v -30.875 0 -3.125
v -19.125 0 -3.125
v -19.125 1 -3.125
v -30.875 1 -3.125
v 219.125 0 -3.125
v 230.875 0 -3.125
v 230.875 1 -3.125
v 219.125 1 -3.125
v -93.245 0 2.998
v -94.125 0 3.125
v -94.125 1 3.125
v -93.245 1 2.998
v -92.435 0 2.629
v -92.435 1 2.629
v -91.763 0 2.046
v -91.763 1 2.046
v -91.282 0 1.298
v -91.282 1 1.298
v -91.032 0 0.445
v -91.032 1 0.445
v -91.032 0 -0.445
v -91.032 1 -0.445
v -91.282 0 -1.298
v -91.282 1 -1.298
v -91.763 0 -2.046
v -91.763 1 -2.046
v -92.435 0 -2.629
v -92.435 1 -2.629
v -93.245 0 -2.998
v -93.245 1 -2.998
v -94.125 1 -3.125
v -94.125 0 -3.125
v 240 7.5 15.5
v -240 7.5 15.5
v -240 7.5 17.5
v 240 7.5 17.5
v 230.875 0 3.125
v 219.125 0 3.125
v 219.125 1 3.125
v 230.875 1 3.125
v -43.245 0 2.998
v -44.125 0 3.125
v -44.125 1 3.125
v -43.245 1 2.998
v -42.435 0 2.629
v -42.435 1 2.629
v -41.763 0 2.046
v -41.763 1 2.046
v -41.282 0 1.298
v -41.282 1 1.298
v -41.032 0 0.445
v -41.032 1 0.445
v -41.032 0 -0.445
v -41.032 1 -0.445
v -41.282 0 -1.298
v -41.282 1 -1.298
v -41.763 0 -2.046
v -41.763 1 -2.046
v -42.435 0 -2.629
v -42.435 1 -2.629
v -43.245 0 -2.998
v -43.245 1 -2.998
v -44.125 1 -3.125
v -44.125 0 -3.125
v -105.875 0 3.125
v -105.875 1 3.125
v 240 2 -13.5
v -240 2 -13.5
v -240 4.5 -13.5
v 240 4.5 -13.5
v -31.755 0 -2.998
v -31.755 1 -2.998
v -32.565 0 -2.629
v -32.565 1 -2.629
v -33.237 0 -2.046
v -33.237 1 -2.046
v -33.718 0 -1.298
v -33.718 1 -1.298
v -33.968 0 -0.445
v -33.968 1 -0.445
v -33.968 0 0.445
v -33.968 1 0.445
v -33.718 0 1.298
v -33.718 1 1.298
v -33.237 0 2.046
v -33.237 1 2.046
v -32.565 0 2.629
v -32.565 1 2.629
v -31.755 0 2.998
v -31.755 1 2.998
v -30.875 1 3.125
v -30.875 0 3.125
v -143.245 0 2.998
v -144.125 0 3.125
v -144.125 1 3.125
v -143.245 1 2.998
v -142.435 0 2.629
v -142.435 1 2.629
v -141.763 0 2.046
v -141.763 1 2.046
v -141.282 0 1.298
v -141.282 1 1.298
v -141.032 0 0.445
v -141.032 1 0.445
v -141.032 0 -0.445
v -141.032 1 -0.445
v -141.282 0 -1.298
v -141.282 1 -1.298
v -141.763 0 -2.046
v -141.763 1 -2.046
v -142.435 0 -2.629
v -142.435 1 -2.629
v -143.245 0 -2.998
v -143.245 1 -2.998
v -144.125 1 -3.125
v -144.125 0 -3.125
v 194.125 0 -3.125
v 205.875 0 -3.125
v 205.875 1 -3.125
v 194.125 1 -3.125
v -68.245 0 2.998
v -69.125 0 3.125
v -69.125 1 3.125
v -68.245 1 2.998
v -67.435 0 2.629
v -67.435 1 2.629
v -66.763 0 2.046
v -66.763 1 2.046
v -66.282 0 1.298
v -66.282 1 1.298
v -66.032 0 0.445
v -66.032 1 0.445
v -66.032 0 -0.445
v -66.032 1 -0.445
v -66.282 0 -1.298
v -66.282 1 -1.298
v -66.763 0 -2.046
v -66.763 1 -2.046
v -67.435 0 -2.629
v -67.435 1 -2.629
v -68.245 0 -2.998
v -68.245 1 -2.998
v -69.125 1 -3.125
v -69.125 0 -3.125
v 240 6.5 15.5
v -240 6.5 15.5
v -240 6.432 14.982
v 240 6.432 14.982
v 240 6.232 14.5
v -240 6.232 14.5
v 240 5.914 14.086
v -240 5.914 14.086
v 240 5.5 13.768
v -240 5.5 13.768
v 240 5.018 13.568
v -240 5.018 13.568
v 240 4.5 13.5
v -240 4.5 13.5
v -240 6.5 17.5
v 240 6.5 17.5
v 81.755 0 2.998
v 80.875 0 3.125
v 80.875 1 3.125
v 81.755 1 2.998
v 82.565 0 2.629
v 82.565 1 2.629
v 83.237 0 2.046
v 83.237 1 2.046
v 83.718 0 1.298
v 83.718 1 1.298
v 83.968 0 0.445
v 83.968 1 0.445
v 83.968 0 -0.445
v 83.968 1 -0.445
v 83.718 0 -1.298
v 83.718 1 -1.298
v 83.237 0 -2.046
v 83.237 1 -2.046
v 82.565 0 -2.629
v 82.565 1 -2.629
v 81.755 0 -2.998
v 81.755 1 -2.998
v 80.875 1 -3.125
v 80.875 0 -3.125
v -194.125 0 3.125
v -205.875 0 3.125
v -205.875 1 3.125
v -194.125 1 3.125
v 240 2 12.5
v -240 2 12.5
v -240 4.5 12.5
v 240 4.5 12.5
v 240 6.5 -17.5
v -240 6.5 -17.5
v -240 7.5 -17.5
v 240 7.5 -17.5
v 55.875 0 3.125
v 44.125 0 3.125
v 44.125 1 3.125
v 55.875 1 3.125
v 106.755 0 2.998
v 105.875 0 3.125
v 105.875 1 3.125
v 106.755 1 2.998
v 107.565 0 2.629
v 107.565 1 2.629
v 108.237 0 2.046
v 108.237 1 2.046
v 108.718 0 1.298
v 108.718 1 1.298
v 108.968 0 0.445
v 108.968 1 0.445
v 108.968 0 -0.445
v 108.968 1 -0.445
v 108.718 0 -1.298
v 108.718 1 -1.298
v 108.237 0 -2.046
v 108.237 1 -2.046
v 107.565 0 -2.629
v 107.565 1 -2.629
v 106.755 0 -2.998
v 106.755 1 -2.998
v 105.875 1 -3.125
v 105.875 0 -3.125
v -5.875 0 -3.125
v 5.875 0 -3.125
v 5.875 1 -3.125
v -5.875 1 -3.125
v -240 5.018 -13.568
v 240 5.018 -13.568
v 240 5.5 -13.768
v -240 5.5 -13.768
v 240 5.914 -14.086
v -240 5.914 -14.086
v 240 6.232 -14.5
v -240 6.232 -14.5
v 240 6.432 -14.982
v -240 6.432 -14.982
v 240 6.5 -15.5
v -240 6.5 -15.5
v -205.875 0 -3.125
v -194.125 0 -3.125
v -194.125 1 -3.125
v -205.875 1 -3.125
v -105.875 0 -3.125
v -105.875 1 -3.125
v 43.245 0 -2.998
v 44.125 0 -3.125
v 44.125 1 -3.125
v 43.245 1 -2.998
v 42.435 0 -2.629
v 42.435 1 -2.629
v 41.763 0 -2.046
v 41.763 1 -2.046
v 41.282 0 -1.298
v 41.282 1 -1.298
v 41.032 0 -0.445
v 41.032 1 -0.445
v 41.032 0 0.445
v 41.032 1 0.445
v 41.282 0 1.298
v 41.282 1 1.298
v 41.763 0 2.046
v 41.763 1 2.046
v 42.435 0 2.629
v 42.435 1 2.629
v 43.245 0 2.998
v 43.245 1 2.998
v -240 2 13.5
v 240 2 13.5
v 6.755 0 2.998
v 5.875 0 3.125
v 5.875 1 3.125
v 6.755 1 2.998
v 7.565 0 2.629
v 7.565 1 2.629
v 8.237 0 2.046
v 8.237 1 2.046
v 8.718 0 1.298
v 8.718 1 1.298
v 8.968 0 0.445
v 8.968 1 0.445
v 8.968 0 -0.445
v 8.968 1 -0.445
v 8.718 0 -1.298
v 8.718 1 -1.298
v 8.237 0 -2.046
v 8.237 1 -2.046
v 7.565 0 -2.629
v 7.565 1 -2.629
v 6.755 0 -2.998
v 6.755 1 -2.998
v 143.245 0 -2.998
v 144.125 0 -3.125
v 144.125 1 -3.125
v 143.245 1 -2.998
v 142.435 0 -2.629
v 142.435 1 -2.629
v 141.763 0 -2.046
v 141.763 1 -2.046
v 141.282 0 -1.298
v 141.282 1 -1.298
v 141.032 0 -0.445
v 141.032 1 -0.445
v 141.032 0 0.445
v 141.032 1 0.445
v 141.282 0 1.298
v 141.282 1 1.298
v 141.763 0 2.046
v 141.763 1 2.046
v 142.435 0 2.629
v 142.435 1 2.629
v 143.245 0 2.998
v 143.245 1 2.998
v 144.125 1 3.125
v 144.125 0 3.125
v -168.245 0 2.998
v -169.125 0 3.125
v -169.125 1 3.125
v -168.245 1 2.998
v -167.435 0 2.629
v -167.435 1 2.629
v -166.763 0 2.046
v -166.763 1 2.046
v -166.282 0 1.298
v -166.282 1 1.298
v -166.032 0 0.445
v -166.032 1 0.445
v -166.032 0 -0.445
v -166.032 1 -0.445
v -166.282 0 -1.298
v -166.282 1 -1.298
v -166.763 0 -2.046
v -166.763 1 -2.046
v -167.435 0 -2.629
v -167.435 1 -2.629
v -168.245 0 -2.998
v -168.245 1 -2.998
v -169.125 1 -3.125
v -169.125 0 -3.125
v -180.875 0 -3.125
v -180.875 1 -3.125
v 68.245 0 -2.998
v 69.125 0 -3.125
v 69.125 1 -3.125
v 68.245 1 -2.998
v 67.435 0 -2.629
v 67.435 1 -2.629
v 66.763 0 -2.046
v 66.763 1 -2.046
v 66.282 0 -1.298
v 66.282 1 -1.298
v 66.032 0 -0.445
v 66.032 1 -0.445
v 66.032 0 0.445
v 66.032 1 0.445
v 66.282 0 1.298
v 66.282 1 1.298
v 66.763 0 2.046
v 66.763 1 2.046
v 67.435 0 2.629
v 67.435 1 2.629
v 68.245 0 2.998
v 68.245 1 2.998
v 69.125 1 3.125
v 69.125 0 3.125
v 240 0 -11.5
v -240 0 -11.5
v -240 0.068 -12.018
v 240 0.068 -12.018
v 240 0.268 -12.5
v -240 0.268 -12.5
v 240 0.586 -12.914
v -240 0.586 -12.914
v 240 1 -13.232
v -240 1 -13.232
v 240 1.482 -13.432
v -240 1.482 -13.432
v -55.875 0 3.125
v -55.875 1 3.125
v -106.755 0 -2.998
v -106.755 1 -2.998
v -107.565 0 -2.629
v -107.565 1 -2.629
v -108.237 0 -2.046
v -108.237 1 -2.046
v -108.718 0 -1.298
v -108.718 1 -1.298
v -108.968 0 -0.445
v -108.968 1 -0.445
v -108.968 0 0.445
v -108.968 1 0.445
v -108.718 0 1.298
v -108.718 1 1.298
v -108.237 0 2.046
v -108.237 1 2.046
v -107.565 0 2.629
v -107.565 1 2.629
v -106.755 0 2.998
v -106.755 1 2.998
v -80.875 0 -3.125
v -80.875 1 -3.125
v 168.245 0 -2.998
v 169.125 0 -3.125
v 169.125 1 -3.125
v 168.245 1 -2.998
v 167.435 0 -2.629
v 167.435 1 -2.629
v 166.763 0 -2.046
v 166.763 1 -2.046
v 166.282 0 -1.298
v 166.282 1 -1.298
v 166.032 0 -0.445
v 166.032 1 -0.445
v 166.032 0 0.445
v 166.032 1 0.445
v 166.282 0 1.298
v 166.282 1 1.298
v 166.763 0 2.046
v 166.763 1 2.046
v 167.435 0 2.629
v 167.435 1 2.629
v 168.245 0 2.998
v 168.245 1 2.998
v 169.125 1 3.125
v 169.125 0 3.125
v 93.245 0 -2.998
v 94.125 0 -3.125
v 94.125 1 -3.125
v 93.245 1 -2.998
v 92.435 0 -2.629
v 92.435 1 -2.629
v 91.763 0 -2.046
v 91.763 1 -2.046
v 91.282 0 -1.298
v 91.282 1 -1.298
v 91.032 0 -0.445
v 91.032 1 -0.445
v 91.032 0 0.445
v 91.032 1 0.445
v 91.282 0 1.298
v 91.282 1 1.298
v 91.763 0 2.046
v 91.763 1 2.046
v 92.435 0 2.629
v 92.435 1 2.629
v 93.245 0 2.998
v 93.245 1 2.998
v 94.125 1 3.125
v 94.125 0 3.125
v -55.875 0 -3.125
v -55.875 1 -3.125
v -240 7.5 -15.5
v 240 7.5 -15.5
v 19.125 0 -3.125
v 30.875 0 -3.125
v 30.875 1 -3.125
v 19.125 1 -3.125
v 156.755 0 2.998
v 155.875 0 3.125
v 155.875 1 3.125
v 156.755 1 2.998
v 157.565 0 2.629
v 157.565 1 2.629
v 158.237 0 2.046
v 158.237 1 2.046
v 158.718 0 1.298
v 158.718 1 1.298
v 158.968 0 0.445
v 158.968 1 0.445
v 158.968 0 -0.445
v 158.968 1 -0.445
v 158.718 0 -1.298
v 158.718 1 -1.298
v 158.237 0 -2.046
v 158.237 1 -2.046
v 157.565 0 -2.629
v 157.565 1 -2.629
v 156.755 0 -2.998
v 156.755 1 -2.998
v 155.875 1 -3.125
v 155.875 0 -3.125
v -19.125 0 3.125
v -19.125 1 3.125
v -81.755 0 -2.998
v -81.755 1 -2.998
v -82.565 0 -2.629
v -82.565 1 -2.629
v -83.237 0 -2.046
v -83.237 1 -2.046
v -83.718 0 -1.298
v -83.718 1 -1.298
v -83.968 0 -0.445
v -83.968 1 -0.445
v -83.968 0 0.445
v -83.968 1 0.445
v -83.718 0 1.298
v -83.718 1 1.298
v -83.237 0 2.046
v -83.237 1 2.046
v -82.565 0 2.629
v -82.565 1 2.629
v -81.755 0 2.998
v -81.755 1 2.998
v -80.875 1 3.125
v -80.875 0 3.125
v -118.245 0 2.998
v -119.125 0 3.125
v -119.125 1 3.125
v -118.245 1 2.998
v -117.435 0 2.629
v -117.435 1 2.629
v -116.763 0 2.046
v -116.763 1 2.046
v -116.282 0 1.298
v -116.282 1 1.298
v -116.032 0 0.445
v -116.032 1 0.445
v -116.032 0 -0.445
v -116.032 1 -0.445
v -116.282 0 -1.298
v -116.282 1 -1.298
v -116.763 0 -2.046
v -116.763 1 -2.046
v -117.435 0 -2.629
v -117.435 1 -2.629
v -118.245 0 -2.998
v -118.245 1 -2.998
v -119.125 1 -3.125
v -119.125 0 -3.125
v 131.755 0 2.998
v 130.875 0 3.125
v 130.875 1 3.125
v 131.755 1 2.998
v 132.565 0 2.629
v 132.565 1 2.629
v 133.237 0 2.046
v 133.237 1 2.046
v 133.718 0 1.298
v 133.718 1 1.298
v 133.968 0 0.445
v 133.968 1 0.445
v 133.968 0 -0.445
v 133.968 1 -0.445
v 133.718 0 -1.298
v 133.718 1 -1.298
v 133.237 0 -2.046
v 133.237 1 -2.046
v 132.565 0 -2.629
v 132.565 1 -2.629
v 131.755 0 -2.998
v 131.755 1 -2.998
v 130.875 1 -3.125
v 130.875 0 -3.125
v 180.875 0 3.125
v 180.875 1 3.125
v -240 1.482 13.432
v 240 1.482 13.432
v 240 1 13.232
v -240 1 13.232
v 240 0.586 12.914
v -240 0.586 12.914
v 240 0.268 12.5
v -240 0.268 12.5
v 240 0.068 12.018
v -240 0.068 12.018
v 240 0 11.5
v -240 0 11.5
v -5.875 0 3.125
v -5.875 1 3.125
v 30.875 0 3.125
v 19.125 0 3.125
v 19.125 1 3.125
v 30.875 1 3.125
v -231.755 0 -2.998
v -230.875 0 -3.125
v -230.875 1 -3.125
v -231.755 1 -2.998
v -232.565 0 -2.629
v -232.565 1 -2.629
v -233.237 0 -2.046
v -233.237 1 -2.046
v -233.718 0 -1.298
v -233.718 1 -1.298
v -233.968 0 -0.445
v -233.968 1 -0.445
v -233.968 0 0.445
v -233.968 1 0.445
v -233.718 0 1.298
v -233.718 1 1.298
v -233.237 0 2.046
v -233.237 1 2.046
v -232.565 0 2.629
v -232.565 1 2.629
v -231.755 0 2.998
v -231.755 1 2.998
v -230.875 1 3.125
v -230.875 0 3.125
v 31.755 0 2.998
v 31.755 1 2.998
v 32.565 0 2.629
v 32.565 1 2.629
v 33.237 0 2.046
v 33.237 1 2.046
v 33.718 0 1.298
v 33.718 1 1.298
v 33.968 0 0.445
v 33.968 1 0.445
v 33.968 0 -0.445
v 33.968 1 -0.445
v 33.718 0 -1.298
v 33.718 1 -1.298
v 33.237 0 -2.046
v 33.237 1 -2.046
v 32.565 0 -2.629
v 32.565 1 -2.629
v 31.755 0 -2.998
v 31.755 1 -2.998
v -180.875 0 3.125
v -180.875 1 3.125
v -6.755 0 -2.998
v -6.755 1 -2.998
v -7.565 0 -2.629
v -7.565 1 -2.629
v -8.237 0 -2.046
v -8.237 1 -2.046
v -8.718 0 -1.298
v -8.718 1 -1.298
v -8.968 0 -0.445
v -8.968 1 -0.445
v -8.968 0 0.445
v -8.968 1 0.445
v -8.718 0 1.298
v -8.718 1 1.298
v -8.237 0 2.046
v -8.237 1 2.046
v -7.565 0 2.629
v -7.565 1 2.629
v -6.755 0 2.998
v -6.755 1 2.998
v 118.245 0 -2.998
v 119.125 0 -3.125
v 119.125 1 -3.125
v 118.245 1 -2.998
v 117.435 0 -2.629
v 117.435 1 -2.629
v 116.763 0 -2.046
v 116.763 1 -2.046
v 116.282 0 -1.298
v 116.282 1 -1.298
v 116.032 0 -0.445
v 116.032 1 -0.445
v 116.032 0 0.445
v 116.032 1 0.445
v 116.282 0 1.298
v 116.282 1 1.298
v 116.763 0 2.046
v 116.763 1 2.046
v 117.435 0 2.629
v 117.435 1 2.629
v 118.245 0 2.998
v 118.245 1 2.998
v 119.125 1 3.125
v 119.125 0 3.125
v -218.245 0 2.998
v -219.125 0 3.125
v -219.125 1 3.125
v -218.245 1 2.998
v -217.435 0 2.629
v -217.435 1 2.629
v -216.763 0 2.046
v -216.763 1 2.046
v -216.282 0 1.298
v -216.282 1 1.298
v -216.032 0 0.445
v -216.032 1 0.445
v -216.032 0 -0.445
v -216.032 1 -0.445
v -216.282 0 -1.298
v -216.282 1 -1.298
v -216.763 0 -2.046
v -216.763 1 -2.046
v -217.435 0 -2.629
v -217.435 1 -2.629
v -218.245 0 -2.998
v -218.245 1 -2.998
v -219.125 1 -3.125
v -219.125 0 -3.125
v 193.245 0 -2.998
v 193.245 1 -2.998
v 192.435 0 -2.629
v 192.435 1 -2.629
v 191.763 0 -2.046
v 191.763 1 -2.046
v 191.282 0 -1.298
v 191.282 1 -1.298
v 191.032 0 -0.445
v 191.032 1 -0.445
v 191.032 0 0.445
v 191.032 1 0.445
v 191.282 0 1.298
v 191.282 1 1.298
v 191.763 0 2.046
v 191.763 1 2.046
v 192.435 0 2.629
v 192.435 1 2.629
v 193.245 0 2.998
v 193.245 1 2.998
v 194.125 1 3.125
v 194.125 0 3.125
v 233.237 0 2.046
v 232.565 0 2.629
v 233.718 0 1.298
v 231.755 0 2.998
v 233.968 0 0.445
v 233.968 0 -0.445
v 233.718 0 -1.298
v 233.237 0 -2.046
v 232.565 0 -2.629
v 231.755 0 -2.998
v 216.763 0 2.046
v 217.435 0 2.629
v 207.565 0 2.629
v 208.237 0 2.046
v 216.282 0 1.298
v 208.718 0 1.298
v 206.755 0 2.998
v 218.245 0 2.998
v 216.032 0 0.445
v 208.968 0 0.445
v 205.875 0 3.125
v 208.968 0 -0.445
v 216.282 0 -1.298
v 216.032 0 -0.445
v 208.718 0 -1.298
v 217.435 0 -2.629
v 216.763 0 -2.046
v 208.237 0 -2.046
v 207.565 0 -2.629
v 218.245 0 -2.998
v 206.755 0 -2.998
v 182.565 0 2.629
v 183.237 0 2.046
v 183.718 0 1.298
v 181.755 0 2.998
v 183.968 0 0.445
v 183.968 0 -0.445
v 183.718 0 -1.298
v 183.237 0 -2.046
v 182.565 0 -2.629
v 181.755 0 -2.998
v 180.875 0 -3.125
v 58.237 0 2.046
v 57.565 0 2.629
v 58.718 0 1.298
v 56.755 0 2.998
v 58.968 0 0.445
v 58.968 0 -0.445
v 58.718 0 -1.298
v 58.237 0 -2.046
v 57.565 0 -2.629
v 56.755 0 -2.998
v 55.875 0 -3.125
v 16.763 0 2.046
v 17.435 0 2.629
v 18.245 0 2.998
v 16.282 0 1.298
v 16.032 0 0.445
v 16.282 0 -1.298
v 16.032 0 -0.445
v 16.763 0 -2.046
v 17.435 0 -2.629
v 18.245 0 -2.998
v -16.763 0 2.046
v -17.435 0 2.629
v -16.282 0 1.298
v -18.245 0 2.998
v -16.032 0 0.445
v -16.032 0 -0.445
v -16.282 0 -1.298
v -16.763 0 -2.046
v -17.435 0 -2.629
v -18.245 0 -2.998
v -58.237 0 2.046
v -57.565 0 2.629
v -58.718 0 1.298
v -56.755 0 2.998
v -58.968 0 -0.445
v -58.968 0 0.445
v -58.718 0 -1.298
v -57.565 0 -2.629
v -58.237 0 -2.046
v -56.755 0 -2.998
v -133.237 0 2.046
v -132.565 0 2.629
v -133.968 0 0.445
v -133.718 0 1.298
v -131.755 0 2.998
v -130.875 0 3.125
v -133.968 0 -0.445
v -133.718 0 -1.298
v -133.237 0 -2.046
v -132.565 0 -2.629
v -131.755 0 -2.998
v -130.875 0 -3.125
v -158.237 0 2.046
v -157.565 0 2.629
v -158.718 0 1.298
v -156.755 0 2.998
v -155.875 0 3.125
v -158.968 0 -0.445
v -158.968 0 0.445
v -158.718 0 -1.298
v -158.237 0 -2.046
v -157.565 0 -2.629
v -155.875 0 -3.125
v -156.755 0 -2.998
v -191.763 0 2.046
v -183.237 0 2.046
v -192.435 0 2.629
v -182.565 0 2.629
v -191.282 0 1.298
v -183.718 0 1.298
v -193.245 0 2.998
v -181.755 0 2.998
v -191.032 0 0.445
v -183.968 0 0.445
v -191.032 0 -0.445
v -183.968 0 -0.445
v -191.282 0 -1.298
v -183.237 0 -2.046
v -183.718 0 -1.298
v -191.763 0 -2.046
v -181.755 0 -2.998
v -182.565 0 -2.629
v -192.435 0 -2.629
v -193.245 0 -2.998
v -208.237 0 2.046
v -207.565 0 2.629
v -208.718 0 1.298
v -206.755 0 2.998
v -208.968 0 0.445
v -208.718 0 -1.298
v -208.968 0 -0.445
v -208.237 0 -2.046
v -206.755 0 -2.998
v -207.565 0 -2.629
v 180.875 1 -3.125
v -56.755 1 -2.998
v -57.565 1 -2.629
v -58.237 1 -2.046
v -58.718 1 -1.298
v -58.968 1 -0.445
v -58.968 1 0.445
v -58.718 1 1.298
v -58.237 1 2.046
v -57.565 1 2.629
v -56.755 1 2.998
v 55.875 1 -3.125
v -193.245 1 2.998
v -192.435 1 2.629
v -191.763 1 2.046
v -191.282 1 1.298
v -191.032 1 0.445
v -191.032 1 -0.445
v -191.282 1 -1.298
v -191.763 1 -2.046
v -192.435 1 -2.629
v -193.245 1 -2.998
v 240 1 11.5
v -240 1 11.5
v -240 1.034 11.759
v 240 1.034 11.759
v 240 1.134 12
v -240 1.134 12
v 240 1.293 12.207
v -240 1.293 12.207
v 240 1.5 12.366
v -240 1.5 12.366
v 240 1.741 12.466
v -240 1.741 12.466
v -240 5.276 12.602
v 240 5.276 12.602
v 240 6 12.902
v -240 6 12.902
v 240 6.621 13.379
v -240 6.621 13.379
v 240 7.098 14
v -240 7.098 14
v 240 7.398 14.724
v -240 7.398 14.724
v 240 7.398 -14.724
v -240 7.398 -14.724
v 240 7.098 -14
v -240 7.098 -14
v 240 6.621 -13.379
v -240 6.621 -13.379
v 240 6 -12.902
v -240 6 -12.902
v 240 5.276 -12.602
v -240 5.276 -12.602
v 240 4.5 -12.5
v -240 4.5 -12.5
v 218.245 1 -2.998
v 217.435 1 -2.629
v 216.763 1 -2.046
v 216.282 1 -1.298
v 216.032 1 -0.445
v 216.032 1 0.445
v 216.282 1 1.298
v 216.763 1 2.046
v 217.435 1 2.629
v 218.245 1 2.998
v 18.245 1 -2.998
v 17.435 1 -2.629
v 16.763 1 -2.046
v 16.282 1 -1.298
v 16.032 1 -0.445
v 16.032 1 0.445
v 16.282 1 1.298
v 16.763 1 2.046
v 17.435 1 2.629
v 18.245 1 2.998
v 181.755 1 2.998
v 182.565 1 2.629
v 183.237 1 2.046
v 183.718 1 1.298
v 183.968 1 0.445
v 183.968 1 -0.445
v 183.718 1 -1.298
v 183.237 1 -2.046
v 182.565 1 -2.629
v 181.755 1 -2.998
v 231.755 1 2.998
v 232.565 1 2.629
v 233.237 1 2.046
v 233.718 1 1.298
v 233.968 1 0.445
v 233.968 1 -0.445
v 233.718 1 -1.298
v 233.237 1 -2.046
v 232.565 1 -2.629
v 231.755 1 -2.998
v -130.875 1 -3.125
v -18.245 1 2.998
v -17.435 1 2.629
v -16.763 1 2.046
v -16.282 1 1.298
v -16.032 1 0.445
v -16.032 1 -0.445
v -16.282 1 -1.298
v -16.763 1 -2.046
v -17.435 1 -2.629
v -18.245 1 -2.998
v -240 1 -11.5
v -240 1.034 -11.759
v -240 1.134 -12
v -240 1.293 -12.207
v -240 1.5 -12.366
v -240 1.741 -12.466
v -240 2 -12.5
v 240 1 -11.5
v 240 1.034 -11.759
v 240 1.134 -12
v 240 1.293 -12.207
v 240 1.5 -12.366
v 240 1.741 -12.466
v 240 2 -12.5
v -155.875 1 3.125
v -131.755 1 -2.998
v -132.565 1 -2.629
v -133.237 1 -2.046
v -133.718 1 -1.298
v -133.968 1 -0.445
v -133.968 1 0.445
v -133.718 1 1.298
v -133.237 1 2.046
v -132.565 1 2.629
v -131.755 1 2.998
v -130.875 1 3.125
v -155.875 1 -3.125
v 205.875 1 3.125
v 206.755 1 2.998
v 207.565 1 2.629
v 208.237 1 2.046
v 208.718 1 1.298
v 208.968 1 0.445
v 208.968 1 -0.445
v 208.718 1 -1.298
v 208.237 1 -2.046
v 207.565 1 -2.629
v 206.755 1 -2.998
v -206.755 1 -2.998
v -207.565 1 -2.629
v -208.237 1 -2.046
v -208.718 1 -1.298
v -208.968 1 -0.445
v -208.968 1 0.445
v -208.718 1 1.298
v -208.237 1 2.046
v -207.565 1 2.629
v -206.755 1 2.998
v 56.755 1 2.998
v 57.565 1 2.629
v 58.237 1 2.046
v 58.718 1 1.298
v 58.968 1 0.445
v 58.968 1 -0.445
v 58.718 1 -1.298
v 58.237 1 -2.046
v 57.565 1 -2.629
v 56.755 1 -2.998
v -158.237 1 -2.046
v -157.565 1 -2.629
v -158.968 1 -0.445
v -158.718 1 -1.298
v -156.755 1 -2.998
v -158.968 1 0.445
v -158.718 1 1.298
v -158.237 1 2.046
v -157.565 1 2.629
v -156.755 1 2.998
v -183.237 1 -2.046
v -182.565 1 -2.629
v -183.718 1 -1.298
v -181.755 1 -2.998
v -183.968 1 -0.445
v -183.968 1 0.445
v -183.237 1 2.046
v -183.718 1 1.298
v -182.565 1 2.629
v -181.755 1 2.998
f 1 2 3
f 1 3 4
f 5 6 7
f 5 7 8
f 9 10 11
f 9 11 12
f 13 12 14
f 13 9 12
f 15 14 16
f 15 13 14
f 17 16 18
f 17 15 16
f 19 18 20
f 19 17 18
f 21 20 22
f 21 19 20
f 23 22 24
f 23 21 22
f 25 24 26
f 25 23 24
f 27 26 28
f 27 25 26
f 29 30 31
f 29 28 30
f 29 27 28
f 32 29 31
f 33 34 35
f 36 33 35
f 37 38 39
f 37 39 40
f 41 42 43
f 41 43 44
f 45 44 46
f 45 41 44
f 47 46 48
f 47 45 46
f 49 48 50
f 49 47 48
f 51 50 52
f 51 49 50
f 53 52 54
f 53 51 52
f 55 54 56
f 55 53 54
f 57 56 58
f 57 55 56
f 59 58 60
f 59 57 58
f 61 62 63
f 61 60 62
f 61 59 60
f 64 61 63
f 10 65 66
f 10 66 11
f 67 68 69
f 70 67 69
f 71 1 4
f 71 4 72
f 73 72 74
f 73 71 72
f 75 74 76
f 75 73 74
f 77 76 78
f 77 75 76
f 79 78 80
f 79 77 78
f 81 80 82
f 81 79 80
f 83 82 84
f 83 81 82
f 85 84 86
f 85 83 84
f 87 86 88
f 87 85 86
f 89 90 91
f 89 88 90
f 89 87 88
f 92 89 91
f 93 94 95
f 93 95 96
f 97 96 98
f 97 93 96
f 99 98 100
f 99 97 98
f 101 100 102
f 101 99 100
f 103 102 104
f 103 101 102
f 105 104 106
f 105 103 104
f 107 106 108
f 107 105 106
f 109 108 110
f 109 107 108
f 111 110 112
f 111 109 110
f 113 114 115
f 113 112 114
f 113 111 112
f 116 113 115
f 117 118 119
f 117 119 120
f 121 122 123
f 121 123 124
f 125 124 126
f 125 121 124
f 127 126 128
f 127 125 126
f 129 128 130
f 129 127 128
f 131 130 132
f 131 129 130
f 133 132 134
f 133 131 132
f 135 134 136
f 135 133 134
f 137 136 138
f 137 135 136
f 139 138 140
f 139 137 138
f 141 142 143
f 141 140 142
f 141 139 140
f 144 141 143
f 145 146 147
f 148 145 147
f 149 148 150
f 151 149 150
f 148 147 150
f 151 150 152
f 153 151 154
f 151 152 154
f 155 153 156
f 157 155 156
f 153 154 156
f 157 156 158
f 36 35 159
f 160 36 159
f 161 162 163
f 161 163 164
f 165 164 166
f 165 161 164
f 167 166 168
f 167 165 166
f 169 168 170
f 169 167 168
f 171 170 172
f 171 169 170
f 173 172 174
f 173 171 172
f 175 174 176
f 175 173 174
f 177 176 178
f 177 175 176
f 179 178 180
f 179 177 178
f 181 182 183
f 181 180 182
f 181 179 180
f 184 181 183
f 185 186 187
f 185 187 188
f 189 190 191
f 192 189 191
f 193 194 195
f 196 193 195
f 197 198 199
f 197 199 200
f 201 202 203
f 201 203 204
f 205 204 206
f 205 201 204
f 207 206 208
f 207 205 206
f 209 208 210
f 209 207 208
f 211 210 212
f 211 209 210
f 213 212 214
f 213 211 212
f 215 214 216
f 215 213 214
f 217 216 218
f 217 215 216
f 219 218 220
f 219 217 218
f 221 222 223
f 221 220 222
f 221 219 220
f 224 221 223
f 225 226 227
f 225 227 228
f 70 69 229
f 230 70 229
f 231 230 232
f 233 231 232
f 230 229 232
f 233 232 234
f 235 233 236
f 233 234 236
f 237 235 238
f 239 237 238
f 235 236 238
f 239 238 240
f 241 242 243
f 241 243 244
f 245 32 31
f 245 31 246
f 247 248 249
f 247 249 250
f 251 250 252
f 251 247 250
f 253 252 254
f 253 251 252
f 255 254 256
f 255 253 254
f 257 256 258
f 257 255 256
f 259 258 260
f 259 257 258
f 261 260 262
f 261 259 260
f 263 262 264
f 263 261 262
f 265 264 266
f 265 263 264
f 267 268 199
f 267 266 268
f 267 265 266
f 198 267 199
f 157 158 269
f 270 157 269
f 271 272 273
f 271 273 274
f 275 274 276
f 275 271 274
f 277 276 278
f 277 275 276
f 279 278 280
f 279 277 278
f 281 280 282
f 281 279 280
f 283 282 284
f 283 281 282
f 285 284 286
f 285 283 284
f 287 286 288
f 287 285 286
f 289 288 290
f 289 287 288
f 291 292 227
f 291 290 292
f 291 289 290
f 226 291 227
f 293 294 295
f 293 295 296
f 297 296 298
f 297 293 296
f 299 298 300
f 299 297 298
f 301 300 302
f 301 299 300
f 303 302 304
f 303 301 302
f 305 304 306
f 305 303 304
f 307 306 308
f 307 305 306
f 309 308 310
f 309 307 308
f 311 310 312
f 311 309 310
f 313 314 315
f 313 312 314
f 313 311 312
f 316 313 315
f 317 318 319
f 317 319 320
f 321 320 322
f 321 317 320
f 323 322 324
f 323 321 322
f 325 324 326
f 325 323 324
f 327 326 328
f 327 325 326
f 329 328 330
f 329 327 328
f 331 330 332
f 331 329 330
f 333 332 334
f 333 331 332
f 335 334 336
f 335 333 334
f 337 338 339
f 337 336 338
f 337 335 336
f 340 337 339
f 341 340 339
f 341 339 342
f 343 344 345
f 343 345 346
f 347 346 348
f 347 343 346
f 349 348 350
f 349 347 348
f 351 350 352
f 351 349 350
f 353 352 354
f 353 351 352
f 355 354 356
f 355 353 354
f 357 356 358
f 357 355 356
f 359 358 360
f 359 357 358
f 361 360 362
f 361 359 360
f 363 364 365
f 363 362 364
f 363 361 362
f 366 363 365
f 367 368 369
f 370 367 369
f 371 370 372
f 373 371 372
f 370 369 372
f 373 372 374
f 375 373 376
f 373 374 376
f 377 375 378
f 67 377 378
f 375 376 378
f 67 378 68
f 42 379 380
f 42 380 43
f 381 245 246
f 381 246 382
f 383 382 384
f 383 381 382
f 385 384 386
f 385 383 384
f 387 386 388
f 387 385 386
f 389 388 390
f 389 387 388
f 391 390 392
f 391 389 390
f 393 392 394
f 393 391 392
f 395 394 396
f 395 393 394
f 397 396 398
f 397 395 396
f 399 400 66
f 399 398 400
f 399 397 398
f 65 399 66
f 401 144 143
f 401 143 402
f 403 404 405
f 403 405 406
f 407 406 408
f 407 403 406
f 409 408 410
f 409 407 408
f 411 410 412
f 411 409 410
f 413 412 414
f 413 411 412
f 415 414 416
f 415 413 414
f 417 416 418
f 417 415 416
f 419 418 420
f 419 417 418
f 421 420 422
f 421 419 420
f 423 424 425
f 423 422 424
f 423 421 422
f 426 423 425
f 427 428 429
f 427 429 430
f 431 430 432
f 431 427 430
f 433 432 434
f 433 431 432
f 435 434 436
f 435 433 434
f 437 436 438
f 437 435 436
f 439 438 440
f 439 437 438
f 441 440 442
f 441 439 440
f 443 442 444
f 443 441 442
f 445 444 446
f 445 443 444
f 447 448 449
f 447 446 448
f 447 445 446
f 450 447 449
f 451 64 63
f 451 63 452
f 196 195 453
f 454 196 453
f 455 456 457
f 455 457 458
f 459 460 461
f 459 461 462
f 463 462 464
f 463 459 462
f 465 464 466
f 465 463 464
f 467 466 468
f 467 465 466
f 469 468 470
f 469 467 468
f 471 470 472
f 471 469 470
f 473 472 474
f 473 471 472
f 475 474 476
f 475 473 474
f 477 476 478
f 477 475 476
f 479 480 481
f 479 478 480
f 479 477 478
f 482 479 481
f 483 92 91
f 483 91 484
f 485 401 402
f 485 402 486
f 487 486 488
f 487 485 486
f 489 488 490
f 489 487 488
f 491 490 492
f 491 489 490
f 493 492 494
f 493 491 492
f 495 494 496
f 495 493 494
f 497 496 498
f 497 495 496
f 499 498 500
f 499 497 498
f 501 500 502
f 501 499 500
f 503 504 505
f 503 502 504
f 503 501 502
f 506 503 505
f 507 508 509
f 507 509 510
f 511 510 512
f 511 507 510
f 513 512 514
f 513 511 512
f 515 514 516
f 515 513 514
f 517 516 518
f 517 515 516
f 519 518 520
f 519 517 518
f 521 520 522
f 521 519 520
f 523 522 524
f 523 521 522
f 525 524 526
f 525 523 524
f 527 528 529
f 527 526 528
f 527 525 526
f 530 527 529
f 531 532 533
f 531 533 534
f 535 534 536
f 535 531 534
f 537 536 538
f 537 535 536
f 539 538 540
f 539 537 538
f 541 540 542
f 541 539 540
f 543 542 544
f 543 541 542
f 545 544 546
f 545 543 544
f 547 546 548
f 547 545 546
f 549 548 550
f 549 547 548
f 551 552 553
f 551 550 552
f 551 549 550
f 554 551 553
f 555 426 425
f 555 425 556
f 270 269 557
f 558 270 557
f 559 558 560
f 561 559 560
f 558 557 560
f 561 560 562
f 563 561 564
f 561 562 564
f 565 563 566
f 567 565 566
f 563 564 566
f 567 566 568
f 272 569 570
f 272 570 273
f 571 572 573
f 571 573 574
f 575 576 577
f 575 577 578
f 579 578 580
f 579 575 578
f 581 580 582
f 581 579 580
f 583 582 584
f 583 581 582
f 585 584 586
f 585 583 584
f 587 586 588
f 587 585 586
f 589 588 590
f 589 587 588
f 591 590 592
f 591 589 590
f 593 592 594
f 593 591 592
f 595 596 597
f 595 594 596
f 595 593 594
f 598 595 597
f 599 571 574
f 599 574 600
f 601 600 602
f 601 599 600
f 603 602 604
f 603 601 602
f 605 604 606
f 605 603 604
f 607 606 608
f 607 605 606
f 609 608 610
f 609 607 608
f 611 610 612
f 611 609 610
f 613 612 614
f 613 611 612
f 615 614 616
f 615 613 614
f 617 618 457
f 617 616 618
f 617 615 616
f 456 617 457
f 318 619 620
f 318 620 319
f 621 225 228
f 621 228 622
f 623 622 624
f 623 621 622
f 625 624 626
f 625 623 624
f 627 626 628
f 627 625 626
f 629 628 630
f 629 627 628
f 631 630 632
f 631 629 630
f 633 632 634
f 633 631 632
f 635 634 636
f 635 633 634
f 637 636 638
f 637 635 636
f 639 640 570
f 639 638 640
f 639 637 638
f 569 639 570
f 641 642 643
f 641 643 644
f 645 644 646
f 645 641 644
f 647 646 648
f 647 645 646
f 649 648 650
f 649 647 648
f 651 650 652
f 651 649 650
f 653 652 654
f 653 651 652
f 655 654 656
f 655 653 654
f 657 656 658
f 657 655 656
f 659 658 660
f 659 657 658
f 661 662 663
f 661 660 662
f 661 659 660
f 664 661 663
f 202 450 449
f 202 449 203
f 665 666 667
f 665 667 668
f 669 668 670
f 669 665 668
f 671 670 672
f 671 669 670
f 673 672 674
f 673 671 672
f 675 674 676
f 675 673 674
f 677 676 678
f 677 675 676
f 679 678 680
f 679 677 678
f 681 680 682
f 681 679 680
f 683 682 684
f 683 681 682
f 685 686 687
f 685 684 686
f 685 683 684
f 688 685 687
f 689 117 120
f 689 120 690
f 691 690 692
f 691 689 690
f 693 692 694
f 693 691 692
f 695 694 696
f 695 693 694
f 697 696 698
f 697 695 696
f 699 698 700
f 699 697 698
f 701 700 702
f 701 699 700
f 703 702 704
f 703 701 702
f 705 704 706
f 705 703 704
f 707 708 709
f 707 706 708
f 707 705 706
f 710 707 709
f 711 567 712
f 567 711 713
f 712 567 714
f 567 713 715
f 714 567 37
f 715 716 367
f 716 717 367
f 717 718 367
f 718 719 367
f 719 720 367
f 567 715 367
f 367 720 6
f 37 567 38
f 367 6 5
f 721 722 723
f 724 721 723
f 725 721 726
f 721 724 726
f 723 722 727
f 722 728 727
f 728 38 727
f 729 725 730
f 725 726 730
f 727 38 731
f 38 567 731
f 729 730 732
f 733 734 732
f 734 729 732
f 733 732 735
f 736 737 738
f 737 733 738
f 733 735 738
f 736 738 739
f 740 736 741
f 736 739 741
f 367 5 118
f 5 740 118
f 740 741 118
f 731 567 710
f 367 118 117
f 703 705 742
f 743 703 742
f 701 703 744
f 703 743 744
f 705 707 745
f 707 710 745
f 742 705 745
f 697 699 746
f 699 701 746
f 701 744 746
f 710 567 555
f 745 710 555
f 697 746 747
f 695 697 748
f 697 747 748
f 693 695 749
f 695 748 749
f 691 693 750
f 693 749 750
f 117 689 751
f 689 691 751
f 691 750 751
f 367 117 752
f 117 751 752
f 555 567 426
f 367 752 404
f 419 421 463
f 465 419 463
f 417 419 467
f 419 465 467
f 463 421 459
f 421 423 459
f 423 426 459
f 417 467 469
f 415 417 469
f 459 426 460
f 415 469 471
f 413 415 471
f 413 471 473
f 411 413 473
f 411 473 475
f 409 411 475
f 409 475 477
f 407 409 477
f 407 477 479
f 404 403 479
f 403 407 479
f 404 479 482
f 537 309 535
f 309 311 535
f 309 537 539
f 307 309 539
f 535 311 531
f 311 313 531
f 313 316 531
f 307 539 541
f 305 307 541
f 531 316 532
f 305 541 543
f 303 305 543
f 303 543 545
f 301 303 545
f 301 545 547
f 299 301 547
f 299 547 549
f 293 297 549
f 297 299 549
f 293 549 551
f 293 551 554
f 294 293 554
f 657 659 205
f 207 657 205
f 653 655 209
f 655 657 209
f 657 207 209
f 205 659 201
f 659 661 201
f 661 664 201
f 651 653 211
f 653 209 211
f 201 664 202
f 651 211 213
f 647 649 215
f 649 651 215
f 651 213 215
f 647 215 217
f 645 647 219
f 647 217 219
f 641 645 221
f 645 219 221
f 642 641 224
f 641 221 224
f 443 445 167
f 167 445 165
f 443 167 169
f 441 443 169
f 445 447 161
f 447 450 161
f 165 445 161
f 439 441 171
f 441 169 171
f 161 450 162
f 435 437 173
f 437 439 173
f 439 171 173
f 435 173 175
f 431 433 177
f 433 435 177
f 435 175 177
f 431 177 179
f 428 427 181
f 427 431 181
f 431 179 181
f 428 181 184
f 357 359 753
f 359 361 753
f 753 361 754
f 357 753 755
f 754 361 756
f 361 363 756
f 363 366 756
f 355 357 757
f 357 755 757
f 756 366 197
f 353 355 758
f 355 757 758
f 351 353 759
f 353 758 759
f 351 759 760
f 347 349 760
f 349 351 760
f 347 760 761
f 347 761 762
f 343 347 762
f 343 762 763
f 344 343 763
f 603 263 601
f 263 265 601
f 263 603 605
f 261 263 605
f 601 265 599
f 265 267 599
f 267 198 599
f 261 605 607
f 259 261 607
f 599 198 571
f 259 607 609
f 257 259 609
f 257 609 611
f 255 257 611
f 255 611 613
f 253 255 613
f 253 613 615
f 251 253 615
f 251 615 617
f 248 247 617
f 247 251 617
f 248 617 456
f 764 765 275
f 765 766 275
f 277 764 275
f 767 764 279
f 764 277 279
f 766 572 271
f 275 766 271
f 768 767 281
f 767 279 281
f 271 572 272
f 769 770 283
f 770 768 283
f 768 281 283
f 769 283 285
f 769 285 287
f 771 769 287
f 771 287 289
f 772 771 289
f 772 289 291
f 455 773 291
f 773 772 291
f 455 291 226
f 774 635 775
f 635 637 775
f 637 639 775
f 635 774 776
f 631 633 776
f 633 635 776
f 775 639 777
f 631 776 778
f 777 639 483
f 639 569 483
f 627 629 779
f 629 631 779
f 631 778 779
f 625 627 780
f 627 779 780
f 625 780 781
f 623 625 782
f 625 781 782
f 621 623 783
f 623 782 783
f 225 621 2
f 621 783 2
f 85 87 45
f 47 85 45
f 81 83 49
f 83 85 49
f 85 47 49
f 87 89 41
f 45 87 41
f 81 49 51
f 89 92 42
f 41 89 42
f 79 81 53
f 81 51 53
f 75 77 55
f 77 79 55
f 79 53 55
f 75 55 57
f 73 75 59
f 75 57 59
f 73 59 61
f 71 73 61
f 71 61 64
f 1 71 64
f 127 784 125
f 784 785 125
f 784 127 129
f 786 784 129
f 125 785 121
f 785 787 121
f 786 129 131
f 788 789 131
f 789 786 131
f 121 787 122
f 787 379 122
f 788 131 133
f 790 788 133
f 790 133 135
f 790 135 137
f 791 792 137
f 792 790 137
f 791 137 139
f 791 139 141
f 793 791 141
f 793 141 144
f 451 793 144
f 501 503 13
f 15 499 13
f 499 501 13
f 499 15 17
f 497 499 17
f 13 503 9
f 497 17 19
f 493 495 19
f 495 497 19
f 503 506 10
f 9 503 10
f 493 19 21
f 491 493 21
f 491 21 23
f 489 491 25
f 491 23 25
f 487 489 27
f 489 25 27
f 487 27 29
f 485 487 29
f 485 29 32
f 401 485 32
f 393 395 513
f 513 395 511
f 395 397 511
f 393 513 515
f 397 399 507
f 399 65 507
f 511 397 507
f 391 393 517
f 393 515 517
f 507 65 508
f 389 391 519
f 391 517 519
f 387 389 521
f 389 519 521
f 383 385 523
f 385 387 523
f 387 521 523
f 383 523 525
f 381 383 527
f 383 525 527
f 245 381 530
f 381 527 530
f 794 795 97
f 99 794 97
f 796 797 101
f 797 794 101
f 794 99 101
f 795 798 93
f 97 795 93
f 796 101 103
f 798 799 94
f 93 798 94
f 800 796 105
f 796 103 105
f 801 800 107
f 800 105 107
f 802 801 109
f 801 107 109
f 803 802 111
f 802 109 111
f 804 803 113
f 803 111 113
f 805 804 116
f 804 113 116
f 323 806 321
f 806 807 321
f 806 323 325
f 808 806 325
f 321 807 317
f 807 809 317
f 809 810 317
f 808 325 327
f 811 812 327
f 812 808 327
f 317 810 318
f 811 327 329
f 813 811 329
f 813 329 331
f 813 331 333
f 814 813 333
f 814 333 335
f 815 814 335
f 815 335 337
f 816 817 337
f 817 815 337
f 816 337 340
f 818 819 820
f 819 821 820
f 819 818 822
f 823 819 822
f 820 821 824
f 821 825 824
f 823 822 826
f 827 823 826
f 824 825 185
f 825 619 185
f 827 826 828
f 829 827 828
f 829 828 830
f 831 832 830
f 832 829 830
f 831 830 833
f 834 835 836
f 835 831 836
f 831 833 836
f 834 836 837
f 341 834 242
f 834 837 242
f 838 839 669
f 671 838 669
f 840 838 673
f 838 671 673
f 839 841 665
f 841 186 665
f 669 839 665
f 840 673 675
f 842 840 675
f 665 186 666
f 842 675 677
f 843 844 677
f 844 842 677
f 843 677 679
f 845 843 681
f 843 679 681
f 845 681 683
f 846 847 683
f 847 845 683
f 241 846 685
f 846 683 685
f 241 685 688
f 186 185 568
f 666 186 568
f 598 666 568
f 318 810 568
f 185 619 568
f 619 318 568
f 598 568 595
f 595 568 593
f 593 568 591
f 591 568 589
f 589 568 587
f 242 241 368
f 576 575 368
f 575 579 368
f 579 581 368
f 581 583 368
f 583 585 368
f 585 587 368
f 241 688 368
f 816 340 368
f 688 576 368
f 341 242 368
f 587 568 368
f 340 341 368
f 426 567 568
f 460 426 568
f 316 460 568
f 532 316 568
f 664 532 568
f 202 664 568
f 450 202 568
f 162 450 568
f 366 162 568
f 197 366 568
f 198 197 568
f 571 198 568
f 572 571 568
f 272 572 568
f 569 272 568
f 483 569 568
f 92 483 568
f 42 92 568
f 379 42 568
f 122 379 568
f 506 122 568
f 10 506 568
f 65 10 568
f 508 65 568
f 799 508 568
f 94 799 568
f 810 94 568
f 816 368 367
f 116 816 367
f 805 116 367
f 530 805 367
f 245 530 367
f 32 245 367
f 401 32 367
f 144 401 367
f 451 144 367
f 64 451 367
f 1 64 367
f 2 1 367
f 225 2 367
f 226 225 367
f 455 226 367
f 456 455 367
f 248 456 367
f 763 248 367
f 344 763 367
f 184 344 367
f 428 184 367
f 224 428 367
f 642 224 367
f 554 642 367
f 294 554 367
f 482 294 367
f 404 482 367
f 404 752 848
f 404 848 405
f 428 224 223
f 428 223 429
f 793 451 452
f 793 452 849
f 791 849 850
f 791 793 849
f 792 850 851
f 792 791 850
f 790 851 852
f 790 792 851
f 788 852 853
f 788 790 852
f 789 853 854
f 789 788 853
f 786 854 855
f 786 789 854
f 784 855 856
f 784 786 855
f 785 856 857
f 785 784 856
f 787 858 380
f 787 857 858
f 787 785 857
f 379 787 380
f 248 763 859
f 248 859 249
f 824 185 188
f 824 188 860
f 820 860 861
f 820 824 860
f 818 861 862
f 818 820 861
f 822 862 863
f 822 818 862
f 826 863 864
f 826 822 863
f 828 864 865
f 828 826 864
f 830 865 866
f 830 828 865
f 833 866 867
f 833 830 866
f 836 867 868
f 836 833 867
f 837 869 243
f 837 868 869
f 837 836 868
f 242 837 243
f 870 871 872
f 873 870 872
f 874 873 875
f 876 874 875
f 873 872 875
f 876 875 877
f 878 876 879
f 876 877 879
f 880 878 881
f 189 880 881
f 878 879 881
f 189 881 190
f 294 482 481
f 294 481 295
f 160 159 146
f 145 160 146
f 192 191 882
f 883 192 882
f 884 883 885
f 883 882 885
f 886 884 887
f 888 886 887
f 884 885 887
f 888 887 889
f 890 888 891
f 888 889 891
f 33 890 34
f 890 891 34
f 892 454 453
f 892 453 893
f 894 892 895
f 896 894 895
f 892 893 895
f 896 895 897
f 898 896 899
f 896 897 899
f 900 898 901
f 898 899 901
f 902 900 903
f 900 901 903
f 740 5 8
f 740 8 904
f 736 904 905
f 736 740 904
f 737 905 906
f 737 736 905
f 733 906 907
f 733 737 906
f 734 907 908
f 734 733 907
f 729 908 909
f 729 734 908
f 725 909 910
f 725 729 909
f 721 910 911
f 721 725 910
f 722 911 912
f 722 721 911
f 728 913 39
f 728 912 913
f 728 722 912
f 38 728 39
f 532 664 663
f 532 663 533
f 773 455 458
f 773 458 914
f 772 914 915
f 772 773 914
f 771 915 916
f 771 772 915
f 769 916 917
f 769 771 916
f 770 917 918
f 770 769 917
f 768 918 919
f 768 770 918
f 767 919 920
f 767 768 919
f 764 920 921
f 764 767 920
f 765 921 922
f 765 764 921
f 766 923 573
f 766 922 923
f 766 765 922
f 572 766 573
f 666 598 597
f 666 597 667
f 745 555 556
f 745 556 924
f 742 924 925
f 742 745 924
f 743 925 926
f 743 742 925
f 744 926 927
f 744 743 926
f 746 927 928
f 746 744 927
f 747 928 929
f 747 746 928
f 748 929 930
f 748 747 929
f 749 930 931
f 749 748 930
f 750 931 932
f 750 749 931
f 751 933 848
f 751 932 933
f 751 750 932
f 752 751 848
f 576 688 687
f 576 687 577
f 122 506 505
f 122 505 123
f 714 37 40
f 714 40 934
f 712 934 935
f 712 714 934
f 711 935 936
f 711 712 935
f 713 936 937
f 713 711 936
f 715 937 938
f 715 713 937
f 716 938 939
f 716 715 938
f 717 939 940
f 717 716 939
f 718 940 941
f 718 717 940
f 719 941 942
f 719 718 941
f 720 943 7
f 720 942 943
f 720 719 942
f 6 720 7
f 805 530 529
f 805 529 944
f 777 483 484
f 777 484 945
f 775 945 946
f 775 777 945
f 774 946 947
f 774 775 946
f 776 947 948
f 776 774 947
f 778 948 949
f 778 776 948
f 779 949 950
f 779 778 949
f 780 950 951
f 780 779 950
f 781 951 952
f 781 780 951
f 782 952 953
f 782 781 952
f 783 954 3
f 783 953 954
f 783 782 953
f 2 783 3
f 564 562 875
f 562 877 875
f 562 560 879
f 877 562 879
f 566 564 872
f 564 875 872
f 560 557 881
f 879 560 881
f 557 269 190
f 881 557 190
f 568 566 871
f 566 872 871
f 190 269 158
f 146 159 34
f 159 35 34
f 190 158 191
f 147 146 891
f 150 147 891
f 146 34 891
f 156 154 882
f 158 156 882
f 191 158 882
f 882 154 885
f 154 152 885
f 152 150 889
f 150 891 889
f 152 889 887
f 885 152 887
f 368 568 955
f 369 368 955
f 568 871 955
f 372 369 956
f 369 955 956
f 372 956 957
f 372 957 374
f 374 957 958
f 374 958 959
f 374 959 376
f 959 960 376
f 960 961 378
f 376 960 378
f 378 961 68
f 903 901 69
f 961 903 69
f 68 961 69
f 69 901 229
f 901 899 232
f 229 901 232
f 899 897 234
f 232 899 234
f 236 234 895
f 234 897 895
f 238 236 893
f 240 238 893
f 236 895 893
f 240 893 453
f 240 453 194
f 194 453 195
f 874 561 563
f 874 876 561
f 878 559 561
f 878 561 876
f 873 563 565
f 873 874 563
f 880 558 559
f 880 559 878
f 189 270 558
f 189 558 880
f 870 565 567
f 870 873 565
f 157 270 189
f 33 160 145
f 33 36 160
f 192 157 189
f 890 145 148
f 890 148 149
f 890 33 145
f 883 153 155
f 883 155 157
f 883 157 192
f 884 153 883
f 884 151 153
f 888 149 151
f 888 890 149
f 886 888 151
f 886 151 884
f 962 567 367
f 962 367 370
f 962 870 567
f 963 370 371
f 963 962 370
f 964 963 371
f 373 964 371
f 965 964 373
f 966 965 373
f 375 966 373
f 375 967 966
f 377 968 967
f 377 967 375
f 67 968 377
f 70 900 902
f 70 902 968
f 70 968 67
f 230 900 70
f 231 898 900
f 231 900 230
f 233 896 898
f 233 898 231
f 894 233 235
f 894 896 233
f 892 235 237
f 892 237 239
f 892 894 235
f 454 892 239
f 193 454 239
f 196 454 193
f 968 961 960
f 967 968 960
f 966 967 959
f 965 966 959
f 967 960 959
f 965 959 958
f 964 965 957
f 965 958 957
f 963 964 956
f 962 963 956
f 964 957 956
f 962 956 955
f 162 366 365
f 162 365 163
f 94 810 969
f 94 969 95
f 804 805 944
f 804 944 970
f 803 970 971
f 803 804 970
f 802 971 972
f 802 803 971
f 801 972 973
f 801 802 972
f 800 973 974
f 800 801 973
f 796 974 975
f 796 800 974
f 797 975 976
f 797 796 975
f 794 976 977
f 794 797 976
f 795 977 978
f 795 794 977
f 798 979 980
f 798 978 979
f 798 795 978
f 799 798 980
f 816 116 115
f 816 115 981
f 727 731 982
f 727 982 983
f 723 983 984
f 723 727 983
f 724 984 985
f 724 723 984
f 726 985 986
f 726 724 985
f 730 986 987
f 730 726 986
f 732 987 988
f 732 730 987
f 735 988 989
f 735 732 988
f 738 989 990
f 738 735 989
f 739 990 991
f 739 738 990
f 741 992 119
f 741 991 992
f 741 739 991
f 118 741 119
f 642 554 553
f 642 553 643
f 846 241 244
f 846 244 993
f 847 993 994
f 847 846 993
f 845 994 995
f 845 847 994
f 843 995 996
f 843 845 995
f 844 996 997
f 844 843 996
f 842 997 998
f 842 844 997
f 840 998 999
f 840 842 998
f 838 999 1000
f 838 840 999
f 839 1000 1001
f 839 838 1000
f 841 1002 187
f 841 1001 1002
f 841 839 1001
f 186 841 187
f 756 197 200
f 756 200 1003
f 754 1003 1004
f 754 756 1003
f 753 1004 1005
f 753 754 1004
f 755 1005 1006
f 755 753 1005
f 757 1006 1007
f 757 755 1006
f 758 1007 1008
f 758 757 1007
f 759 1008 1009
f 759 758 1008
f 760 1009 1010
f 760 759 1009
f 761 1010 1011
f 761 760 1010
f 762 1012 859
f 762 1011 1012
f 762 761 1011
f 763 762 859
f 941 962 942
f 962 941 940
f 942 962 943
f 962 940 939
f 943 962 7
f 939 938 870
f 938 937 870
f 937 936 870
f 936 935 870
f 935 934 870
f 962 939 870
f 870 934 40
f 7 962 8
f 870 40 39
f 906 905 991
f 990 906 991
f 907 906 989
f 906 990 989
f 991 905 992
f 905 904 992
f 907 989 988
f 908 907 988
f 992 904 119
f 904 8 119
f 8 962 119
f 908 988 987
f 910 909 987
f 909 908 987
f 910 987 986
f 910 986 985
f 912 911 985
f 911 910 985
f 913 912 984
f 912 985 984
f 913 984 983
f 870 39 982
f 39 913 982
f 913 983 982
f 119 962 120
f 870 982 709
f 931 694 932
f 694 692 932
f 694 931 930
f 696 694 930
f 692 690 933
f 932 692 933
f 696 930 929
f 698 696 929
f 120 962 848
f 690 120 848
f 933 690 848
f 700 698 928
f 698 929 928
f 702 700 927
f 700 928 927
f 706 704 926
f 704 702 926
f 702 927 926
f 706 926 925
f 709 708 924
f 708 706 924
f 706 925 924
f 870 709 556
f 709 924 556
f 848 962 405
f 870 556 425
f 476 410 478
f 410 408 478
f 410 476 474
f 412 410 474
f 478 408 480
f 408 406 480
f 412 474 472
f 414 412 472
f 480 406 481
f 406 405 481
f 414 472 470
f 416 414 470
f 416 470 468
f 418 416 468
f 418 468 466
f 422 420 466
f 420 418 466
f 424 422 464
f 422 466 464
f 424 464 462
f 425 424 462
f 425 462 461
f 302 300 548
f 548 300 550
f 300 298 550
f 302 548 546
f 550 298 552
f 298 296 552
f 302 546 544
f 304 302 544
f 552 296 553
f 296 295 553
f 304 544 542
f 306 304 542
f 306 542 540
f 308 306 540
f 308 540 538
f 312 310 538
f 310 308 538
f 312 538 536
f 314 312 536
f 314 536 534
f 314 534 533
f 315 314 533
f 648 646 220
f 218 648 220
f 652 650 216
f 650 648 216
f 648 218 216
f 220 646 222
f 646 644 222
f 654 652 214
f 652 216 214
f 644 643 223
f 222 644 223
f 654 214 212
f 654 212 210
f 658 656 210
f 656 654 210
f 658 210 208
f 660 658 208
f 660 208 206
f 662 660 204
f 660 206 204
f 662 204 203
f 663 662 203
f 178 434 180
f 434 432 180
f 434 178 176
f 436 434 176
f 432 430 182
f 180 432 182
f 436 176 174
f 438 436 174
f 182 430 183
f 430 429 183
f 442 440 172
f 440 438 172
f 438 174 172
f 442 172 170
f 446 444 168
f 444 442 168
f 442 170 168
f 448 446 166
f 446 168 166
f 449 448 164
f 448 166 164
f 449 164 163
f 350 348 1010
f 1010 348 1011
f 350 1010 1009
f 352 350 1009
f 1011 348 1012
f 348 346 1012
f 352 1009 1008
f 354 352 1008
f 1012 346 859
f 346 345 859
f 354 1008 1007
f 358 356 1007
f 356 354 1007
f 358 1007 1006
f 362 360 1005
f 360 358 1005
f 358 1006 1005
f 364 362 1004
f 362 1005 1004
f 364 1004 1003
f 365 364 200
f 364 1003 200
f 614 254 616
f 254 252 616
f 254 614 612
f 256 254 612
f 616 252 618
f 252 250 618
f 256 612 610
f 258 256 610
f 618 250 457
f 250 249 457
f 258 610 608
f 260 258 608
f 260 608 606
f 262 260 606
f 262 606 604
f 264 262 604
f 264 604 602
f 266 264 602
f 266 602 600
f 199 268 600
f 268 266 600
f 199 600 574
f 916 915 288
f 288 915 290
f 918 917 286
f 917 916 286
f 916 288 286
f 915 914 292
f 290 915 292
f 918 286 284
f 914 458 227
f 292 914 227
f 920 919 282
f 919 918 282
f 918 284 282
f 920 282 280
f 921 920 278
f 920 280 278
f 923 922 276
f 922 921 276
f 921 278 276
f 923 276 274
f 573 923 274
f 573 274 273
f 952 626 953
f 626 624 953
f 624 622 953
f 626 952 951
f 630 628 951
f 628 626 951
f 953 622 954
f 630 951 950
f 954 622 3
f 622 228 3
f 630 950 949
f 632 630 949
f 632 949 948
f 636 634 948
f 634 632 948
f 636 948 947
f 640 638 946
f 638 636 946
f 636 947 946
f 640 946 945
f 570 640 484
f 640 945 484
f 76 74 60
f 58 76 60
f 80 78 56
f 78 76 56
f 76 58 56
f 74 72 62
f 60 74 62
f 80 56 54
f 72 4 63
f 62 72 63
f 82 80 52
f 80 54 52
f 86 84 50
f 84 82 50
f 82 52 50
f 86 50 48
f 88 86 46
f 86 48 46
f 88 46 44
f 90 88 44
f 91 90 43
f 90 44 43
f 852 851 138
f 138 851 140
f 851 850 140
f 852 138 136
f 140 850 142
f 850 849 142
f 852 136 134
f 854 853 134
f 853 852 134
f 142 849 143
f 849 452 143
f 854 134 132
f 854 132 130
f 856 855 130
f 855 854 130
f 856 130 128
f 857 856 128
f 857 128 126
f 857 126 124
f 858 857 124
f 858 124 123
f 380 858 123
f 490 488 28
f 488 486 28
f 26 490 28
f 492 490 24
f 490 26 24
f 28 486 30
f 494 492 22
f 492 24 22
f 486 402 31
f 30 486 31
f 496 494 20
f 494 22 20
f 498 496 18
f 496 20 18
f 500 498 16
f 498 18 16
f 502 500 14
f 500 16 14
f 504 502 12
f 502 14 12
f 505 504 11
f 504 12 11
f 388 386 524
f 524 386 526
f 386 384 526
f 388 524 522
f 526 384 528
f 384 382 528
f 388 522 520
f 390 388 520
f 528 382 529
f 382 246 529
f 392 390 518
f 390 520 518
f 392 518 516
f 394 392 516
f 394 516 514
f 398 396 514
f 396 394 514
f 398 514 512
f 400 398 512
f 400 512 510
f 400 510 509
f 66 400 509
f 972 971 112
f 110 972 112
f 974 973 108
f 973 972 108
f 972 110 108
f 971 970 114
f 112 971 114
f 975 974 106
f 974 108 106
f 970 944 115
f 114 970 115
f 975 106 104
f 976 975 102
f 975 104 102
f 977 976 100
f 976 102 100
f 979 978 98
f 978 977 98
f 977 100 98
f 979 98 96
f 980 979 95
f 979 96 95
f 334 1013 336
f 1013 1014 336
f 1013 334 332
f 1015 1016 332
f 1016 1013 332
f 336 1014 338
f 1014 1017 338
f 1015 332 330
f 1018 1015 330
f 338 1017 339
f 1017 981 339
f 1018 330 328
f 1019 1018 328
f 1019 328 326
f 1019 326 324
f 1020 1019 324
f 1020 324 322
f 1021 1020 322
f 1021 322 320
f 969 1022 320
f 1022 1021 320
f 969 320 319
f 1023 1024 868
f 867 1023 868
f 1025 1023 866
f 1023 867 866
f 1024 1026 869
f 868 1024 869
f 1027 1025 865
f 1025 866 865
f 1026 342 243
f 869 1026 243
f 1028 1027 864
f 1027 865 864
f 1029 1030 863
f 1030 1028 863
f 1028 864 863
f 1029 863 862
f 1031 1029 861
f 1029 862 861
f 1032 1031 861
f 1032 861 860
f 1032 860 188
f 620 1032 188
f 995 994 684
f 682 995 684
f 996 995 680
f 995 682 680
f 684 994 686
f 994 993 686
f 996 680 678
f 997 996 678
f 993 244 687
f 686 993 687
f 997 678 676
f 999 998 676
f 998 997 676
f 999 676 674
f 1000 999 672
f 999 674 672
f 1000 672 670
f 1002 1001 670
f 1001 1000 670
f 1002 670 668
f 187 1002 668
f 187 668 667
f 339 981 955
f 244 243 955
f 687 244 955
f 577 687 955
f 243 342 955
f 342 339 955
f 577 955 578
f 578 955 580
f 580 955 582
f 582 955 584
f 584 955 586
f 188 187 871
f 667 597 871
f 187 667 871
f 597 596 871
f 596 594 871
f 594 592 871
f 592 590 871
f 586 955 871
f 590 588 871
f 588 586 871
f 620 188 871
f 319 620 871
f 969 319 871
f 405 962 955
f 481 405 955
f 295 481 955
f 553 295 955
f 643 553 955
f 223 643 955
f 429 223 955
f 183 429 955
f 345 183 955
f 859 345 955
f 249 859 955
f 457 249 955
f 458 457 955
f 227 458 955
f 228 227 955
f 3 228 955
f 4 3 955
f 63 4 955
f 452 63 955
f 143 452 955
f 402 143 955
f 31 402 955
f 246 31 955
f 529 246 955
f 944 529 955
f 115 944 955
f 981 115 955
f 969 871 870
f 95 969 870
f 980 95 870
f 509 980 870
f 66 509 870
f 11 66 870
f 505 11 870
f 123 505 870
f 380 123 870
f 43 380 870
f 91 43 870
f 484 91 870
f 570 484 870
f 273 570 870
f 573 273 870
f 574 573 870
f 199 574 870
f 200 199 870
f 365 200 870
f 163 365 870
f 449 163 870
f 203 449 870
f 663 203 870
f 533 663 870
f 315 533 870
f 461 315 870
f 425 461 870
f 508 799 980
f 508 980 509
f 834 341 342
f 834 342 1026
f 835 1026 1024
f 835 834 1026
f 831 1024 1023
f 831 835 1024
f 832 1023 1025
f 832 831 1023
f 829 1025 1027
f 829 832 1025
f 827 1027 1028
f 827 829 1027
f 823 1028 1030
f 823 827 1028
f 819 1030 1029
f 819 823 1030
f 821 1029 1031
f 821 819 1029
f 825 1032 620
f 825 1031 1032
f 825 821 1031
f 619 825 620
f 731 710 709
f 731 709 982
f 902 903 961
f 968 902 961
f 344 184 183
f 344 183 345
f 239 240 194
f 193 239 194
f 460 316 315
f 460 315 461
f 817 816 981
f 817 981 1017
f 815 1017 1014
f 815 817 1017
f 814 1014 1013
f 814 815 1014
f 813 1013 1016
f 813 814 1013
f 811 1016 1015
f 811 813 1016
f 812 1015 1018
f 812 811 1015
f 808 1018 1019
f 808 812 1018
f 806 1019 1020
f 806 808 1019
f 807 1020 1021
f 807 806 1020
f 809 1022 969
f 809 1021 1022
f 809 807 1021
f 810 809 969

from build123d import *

# Parameters (mm, degrees)
EXTRUDE_THIN1_DEPTH      = 240
EXTRUDE_THIN1_DEPTH_BACK = 240
CUT_EXTRUDE1_REACH       = 242.754
LPATTERN1_COUNT          = 10
LPATTERN1_PITCH          = 25
LPATTERN1_COL_COUNT      = 10
LPATTERN1_COL_PITCH      = 25


with BuildPart() as part:
    # Sketch1 → Extrude-Thin1 (new, two sides: drawn at the far end of the back side and taken through both)
    with BuildSketch(Plane(origin=(0, 0, 0), x_dir=(0, 0, -1), z_dir=(1, 0, 0)).offset(-EXTRUDE_THIN1_DEPTH_BACK)):
        with BuildLine():
            Line((-17.5, 6.5), (-15.5, 6.5))
            ThreePointArc((-15.5, 6.5), (-14.085786438, 5.914213562), (-13.5, 4.5))
            Line((-13.5, 4.5), (-13.5, 2))
            ThreePointArc((-13.5, 2), (-12.914213562, 0.585786438), (-11.5, 0))
            Line((-11.5, 0), (11.5, 0))
            ThreePointArc((11.5, 0), (12.914213562, 0.585786438), (13.5, 2))
            Line((13.5, 2), (13.5, 4.5))
            ThreePointArc((13.5, 4.5), (14.085786438, 5.914213562), (15.5, 6.5))
            Line((15.5, 6.5), (17.5, 6.5))
            Line((17.5, 6.5), (17.5, 7.5))
            Line((17.5, 7.5), (15.5, 7.5))
            ThreePointArc((15.5, 7.5), (13.378679656, 6.621320344), (12.5, 4.5))
            Line((12.5, 4.5), (12.5, 2))
            ThreePointArc((12.5, 2), (12.207106781, 1.292893219), (11.5, 1))
            Line((11.5, 1), (-11.5, 1))
            ThreePointArc((-11.5, 1), (-12.207106781, 1.292893219), (-12.5, 2))
            Line((-12.5, 2), (-12.5, 4.5))
            ThreePointArc((-12.5, 4.5), (-13.378679656, 6.621320344), (-15.5, 7.5))
            Line((-15.5, 7.5), (-17.5, 7.5))
            Line((-17.5, 7.5), (-17.5, 6.5))
        make_face()
    extrude(amount=EXTRUDE_THIN1_DEPTH + EXTRUDE_THIN1_DEPTH_BACK)

    # Sketch2 → Cut-Extrude1 (cut, up to next)
    with BuildSketch(Plane.XZ, mode=Mode.PRIVATE) as cut_extrude1_sk1:
        with BuildLine():
            Line((-5.875, 3.125), (5.875, 3.125))
            ThreePointArc((5.875, 3.125), (9, 0), (5.875, -3.125))
            Line((5.875, -3.125), (-5.875, -3.125))
            ThreePointArc((-5.875, -3.125), (-9, 0), (-5.875, 3.125))
        make_face()
    cut_extrude1_tool1 = extrude(cut_extrude1_sk1.sketch, amount=-CUT_EXTRUDE1_REACH, mode=Mode.PRIVATE) & part.part
    cut_extrude1 = cut_extrude1_tool1.solids().sort_by_distance((0, 0, 0))[0]
    add(cut_extrude1, mode=Mode.SUBTRACT)

    # LPattern1: Cut-Extrude1 ×10
    with Locations(*[(i * LPATTERN1_PITCH, 0, 0) for i in range(1, LPATTERN1_COUNT)]):
        add(cut_extrude1, mode=Mode.SUBTRACT)

    # LPattern1 col: Cut-Extrude1 ×10
    with Locations(*[(-i * LPATTERN1_COL_PITCH, 0, 0) for i in range(1, LPATTERN1_COL_COUNT)]):
        add(cut_extrude1, mode=Mode.SUBTRACT)


solid = part.part
